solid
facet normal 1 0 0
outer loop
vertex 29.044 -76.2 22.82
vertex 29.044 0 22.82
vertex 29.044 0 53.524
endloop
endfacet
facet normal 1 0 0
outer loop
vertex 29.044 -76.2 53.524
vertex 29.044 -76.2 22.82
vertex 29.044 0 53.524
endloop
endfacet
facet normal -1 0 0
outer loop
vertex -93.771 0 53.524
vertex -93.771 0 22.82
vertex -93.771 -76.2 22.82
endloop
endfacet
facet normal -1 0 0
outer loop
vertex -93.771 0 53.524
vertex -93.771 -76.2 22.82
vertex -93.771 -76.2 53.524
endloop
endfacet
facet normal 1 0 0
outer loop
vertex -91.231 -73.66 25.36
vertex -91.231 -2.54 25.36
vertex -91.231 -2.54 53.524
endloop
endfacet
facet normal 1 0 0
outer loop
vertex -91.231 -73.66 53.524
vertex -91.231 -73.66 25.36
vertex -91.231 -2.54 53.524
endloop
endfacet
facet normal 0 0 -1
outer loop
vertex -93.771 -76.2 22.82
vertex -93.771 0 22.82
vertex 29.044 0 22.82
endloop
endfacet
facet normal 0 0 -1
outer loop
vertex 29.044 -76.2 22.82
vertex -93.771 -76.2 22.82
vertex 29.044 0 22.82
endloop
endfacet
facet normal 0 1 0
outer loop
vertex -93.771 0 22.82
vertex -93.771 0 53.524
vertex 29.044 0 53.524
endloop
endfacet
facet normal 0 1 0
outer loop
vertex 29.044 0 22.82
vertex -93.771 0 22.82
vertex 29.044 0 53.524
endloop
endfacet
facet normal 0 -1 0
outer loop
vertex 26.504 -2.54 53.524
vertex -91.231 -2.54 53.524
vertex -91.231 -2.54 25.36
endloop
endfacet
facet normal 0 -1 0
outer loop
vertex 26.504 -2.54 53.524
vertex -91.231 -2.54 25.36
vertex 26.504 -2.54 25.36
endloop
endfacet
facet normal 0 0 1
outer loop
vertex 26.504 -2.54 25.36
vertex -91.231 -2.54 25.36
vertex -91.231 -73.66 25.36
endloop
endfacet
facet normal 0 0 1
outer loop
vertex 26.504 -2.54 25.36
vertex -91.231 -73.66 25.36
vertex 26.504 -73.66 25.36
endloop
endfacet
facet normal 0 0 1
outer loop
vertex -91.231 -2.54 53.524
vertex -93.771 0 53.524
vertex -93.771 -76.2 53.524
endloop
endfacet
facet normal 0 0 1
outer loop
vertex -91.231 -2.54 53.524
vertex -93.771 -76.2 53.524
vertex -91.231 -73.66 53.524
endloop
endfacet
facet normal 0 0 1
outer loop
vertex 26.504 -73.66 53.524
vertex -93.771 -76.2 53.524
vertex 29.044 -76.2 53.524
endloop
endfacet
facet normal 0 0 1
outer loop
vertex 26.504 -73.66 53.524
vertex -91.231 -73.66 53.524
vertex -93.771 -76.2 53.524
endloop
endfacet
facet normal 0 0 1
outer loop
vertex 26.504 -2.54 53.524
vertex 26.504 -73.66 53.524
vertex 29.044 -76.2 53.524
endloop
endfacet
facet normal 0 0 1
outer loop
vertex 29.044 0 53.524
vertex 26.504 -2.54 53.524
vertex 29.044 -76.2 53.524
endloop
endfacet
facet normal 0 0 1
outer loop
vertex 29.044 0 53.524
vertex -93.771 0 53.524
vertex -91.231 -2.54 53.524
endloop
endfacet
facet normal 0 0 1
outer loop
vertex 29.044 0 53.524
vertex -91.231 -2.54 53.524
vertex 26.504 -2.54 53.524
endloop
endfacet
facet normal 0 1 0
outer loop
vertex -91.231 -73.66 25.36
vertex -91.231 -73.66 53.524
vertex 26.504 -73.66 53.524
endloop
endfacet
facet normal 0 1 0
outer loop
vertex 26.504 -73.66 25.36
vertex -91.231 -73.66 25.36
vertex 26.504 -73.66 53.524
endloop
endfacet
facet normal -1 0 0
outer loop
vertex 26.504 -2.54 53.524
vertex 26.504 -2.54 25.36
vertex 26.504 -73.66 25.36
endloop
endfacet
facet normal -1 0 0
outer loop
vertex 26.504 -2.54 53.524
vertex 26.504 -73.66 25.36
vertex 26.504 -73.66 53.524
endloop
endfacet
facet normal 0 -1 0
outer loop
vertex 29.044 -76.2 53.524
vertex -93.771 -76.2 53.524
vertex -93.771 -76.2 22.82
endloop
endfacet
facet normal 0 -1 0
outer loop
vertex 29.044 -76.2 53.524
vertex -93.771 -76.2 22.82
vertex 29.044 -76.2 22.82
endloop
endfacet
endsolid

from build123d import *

# Parameters (mm, degrees)
F0_W     = 122.814625
F0_H     = 30.703664
F1_DEPTH = 76.2
F2_T     = -2.54


with BuildPart() as f1:
    # F0 (on Front) → F1 (new body)
    with BuildSketch(Plane.XZ):
        with Locations((-32.36334, 38.172156)):
            Rectangle(F0_W, F0_H)
    extrude(amount=F1_DEPTH)

    # F2
    f2_openings = [f1.faces().sort_by_distance(p)[0] for p in [
        (-32.36334, -38.1, 53.523988),
    ]]
    offset(amount=F2_T, openings=f2_openings)


solid = f1.part
